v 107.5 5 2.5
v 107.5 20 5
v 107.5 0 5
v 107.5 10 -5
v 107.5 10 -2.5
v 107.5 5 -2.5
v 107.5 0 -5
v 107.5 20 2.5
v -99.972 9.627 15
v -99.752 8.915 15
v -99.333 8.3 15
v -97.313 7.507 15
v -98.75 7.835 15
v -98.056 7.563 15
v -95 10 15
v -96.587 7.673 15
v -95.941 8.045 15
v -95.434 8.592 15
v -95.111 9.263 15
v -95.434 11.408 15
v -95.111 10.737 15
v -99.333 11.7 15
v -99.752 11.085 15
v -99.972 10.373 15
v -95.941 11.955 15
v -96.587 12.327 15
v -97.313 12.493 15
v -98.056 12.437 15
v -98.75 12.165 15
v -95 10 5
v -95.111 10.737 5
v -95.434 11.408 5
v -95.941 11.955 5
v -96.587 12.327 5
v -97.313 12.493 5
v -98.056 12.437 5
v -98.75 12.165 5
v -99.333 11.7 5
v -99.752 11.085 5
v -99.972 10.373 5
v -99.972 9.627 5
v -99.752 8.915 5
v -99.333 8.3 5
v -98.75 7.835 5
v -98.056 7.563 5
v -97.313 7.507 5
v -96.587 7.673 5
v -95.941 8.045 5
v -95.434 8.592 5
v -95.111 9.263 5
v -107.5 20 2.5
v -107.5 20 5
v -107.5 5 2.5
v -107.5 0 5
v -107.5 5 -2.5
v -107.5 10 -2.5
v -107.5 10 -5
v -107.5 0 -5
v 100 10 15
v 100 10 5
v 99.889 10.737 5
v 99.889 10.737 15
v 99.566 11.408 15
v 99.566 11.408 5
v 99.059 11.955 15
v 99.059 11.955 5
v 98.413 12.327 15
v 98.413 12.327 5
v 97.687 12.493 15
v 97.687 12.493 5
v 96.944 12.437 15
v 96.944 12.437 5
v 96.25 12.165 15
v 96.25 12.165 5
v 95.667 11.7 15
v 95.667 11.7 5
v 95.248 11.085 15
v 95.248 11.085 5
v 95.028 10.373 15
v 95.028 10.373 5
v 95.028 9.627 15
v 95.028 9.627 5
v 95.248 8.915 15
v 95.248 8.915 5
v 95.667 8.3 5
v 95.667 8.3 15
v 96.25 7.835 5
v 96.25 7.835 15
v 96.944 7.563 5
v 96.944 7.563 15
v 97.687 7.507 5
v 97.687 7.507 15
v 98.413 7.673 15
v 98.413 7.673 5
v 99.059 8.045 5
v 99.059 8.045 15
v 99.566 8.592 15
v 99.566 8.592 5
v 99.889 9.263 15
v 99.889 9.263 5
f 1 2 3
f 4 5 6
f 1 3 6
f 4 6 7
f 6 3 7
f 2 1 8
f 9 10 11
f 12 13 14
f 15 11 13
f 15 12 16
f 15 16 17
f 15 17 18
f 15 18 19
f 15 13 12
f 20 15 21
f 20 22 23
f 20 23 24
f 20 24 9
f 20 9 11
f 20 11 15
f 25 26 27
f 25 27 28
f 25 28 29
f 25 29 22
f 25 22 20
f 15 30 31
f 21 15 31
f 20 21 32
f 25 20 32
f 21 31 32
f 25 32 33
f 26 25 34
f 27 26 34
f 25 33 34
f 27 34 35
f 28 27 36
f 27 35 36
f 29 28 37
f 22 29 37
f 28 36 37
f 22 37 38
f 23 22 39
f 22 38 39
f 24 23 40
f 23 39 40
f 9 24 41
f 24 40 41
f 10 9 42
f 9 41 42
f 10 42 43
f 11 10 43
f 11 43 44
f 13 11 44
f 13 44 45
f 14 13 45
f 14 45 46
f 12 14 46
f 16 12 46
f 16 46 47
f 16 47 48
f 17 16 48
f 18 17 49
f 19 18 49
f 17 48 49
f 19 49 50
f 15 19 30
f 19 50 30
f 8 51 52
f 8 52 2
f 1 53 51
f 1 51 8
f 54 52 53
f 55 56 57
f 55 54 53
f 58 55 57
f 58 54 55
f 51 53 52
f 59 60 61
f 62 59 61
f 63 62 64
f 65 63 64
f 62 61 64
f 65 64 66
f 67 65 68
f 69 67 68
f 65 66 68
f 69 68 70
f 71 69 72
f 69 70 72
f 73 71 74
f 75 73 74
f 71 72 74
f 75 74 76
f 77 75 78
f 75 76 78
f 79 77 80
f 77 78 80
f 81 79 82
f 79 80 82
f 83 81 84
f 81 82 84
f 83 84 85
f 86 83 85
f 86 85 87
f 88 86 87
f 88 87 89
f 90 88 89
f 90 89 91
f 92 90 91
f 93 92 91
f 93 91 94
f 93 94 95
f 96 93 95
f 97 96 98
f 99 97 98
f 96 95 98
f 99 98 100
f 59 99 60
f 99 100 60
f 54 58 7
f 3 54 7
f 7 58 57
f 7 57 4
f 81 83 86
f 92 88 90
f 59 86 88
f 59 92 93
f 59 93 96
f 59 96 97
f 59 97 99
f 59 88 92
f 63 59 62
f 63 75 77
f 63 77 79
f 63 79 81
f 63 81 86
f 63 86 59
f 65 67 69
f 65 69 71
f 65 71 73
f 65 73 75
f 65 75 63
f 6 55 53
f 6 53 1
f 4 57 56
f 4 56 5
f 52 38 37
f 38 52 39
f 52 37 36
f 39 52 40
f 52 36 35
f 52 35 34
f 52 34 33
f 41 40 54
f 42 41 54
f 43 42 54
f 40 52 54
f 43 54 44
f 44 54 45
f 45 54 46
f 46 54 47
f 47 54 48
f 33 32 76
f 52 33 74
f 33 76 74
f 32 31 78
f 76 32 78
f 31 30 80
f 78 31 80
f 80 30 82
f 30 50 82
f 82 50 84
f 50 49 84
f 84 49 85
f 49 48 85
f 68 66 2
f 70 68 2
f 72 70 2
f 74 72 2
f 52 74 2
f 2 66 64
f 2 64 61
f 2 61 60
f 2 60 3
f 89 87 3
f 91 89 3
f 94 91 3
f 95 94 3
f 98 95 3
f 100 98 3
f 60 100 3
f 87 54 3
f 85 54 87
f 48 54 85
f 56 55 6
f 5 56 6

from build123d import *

# Parameters (mm, degrees)
SKETCH1_W           = 215
SKETCH1_H           = 10
BOSS_EXTRUDE1_DEPTH = 5
SKETCH4_W           = 215
SKETCH4_H           = 2.5
BOSS_EXTRUDE7_DEPTH = 15
SKETCH6_W           = 215
SKETCH6_H           = 2.5
BOSS_EXTRUDE8_DEPTH = 5
SKETCH7_R           = 2.5
BOSS_EXTRUDE9_DEPTH = 10


with BuildPart() as part:
    # Sketch1 → Boss-Extrude1 (new body)
    with BuildSketch(Plane(origin=(0, 0, 0), x_dir=(1, 0, 0), z_dir=(0, 1, 0))):
        Rectangle(SKETCH1_W, SKETCH1_H)
    extrude(amount=BOSS_EXTRUDE1_DEPTH)

    # Sketch4 → Boss-Extrude7 (add)
    with BuildSketch(Plane(origin=(0, 5, 0), x_dir=(1, 0, 0), z_dir=(0, 1, 0))):
        with Locations((0, -3.75)):
            Rectangle(SKETCH4_W, SKETCH4_H)
    extrude(amount=BOSS_EXTRUDE7_DEPTH)

    # Sketch6 → Boss-Extrude8 (add)
    with BuildSketch(Plane(origin=(0, 5, 0), x_dir=(1, 0, 0), z_dir=(0, 1, 0))):
        with Locations((0, 3.75)):
            Rectangle(SKETCH6_W, SKETCH6_H)
    extrude(amount=BOSS_EXTRUDE8_DEPTH)

    # Sketch7 → Boss-Extrude9 (add)
    with BuildSketch(Plane.XY.offset(5)):
        with Locations((-97.5, 10)):
            Circle(SKETCH7_R)
        with Locations((97.5, 10)):
            Circle(SKETCH7_R)
    extrude(amount=BOSS_EXTRUDE9_DEPTH)


solid = part.part
